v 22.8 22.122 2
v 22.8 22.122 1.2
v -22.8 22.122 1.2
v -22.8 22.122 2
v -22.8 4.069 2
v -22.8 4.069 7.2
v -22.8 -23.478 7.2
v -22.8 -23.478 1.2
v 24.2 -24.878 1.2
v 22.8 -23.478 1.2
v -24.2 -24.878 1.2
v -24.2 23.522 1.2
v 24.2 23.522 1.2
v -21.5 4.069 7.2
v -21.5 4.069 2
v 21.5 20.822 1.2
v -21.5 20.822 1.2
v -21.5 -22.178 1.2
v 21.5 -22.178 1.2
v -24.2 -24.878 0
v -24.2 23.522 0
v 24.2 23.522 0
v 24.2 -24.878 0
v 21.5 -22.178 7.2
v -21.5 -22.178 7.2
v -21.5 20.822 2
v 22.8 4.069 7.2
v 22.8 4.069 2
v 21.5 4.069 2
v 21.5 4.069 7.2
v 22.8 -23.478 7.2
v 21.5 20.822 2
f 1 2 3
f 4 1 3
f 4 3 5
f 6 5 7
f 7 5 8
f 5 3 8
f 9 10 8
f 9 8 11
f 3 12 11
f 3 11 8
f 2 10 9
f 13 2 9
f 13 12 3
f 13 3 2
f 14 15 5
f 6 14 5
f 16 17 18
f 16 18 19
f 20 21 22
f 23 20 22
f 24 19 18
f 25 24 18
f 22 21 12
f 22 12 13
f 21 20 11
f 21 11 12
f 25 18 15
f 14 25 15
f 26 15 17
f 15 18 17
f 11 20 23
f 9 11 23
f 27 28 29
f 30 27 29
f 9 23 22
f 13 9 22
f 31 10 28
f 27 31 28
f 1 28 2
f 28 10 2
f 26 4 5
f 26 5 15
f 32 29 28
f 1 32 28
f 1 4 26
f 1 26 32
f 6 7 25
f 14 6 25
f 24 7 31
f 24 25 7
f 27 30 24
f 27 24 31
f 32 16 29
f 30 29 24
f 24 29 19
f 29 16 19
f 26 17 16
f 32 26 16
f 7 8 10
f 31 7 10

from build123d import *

# Parameters (mm, degrees)
F0_W     = 48.4
F0_H     = 48.4
F3_DEPTH = 1.2
F4_DEPTH = 7.2
F5_DEPTH = 2


with BuildPart() as f3:
    # F0 (on Top) → F3 (new body)
    with BuildSketch(Plane.XY):
        with Locations((0, -0.678107)):
            Rectangle(F0_W, F0_H)
        Polygon((-22.8, 4.06864), (-22.8, 22.121893), (22.8, 22.121893), (22.8, 4.06864), (22.8, -23.478107), (-22.8, -23.478107), align=None, mode=Mode.SUBTRACT)
        Polygon((-21.5, 20.821893), (-21.5, 4.06864), (-21.5, -22.178107), (21.5, -22.178107), (21.5, 4.06864), (21.5, 20.821893), align=None)
        Polygon((22.8, 22.121893), (-22.8, 22.121893), (-22.8, 4.06864), (-21.5, 4.06864), (-21.5, 20.821893), (21.5, 20.821893), (21.5, 4.06864), (22.8, 4.06864), align=None)
        Polygon((-21.5, 4.06864), (-22.8, 4.06864), (-22.8, -23.478107), (22.8, -23.478107), (22.8, 4.06864), (21.5, 4.06864), (21.5, -22.178107), (-21.5, -22.178107), align=None)
    extrude(amount=F3_DEPTH)

    # F1 (on Top) → F4 (join)
    with BuildSketch(Plane.XY):
        Polygon((-21.5, 4.06864), (-22.8, 4.06864), (-22.8, -23.478107), (22.8, -23.478107), (22.8, 4.06864), (21.5, 4.06864), (21.5, -22.178107), (-21.5, -22.178107), align=None)
    extrude(amount=F4_DEPTH)

    # F2 (on Top) → F5 (join)
    with BuildSketch(Plane.XY):
        Polygon((22.8, 22.121893), (-22.8, 22.121893), (-22.8, 4.06864), (-21.5, 4.06864), (-21.5, 20.821893), (21.5, 20.821893), (21.5, 4.06864), (22.8, 4.06864), align=None)
    extrude(amount=F5_DEPTH)


solid = f3.part
